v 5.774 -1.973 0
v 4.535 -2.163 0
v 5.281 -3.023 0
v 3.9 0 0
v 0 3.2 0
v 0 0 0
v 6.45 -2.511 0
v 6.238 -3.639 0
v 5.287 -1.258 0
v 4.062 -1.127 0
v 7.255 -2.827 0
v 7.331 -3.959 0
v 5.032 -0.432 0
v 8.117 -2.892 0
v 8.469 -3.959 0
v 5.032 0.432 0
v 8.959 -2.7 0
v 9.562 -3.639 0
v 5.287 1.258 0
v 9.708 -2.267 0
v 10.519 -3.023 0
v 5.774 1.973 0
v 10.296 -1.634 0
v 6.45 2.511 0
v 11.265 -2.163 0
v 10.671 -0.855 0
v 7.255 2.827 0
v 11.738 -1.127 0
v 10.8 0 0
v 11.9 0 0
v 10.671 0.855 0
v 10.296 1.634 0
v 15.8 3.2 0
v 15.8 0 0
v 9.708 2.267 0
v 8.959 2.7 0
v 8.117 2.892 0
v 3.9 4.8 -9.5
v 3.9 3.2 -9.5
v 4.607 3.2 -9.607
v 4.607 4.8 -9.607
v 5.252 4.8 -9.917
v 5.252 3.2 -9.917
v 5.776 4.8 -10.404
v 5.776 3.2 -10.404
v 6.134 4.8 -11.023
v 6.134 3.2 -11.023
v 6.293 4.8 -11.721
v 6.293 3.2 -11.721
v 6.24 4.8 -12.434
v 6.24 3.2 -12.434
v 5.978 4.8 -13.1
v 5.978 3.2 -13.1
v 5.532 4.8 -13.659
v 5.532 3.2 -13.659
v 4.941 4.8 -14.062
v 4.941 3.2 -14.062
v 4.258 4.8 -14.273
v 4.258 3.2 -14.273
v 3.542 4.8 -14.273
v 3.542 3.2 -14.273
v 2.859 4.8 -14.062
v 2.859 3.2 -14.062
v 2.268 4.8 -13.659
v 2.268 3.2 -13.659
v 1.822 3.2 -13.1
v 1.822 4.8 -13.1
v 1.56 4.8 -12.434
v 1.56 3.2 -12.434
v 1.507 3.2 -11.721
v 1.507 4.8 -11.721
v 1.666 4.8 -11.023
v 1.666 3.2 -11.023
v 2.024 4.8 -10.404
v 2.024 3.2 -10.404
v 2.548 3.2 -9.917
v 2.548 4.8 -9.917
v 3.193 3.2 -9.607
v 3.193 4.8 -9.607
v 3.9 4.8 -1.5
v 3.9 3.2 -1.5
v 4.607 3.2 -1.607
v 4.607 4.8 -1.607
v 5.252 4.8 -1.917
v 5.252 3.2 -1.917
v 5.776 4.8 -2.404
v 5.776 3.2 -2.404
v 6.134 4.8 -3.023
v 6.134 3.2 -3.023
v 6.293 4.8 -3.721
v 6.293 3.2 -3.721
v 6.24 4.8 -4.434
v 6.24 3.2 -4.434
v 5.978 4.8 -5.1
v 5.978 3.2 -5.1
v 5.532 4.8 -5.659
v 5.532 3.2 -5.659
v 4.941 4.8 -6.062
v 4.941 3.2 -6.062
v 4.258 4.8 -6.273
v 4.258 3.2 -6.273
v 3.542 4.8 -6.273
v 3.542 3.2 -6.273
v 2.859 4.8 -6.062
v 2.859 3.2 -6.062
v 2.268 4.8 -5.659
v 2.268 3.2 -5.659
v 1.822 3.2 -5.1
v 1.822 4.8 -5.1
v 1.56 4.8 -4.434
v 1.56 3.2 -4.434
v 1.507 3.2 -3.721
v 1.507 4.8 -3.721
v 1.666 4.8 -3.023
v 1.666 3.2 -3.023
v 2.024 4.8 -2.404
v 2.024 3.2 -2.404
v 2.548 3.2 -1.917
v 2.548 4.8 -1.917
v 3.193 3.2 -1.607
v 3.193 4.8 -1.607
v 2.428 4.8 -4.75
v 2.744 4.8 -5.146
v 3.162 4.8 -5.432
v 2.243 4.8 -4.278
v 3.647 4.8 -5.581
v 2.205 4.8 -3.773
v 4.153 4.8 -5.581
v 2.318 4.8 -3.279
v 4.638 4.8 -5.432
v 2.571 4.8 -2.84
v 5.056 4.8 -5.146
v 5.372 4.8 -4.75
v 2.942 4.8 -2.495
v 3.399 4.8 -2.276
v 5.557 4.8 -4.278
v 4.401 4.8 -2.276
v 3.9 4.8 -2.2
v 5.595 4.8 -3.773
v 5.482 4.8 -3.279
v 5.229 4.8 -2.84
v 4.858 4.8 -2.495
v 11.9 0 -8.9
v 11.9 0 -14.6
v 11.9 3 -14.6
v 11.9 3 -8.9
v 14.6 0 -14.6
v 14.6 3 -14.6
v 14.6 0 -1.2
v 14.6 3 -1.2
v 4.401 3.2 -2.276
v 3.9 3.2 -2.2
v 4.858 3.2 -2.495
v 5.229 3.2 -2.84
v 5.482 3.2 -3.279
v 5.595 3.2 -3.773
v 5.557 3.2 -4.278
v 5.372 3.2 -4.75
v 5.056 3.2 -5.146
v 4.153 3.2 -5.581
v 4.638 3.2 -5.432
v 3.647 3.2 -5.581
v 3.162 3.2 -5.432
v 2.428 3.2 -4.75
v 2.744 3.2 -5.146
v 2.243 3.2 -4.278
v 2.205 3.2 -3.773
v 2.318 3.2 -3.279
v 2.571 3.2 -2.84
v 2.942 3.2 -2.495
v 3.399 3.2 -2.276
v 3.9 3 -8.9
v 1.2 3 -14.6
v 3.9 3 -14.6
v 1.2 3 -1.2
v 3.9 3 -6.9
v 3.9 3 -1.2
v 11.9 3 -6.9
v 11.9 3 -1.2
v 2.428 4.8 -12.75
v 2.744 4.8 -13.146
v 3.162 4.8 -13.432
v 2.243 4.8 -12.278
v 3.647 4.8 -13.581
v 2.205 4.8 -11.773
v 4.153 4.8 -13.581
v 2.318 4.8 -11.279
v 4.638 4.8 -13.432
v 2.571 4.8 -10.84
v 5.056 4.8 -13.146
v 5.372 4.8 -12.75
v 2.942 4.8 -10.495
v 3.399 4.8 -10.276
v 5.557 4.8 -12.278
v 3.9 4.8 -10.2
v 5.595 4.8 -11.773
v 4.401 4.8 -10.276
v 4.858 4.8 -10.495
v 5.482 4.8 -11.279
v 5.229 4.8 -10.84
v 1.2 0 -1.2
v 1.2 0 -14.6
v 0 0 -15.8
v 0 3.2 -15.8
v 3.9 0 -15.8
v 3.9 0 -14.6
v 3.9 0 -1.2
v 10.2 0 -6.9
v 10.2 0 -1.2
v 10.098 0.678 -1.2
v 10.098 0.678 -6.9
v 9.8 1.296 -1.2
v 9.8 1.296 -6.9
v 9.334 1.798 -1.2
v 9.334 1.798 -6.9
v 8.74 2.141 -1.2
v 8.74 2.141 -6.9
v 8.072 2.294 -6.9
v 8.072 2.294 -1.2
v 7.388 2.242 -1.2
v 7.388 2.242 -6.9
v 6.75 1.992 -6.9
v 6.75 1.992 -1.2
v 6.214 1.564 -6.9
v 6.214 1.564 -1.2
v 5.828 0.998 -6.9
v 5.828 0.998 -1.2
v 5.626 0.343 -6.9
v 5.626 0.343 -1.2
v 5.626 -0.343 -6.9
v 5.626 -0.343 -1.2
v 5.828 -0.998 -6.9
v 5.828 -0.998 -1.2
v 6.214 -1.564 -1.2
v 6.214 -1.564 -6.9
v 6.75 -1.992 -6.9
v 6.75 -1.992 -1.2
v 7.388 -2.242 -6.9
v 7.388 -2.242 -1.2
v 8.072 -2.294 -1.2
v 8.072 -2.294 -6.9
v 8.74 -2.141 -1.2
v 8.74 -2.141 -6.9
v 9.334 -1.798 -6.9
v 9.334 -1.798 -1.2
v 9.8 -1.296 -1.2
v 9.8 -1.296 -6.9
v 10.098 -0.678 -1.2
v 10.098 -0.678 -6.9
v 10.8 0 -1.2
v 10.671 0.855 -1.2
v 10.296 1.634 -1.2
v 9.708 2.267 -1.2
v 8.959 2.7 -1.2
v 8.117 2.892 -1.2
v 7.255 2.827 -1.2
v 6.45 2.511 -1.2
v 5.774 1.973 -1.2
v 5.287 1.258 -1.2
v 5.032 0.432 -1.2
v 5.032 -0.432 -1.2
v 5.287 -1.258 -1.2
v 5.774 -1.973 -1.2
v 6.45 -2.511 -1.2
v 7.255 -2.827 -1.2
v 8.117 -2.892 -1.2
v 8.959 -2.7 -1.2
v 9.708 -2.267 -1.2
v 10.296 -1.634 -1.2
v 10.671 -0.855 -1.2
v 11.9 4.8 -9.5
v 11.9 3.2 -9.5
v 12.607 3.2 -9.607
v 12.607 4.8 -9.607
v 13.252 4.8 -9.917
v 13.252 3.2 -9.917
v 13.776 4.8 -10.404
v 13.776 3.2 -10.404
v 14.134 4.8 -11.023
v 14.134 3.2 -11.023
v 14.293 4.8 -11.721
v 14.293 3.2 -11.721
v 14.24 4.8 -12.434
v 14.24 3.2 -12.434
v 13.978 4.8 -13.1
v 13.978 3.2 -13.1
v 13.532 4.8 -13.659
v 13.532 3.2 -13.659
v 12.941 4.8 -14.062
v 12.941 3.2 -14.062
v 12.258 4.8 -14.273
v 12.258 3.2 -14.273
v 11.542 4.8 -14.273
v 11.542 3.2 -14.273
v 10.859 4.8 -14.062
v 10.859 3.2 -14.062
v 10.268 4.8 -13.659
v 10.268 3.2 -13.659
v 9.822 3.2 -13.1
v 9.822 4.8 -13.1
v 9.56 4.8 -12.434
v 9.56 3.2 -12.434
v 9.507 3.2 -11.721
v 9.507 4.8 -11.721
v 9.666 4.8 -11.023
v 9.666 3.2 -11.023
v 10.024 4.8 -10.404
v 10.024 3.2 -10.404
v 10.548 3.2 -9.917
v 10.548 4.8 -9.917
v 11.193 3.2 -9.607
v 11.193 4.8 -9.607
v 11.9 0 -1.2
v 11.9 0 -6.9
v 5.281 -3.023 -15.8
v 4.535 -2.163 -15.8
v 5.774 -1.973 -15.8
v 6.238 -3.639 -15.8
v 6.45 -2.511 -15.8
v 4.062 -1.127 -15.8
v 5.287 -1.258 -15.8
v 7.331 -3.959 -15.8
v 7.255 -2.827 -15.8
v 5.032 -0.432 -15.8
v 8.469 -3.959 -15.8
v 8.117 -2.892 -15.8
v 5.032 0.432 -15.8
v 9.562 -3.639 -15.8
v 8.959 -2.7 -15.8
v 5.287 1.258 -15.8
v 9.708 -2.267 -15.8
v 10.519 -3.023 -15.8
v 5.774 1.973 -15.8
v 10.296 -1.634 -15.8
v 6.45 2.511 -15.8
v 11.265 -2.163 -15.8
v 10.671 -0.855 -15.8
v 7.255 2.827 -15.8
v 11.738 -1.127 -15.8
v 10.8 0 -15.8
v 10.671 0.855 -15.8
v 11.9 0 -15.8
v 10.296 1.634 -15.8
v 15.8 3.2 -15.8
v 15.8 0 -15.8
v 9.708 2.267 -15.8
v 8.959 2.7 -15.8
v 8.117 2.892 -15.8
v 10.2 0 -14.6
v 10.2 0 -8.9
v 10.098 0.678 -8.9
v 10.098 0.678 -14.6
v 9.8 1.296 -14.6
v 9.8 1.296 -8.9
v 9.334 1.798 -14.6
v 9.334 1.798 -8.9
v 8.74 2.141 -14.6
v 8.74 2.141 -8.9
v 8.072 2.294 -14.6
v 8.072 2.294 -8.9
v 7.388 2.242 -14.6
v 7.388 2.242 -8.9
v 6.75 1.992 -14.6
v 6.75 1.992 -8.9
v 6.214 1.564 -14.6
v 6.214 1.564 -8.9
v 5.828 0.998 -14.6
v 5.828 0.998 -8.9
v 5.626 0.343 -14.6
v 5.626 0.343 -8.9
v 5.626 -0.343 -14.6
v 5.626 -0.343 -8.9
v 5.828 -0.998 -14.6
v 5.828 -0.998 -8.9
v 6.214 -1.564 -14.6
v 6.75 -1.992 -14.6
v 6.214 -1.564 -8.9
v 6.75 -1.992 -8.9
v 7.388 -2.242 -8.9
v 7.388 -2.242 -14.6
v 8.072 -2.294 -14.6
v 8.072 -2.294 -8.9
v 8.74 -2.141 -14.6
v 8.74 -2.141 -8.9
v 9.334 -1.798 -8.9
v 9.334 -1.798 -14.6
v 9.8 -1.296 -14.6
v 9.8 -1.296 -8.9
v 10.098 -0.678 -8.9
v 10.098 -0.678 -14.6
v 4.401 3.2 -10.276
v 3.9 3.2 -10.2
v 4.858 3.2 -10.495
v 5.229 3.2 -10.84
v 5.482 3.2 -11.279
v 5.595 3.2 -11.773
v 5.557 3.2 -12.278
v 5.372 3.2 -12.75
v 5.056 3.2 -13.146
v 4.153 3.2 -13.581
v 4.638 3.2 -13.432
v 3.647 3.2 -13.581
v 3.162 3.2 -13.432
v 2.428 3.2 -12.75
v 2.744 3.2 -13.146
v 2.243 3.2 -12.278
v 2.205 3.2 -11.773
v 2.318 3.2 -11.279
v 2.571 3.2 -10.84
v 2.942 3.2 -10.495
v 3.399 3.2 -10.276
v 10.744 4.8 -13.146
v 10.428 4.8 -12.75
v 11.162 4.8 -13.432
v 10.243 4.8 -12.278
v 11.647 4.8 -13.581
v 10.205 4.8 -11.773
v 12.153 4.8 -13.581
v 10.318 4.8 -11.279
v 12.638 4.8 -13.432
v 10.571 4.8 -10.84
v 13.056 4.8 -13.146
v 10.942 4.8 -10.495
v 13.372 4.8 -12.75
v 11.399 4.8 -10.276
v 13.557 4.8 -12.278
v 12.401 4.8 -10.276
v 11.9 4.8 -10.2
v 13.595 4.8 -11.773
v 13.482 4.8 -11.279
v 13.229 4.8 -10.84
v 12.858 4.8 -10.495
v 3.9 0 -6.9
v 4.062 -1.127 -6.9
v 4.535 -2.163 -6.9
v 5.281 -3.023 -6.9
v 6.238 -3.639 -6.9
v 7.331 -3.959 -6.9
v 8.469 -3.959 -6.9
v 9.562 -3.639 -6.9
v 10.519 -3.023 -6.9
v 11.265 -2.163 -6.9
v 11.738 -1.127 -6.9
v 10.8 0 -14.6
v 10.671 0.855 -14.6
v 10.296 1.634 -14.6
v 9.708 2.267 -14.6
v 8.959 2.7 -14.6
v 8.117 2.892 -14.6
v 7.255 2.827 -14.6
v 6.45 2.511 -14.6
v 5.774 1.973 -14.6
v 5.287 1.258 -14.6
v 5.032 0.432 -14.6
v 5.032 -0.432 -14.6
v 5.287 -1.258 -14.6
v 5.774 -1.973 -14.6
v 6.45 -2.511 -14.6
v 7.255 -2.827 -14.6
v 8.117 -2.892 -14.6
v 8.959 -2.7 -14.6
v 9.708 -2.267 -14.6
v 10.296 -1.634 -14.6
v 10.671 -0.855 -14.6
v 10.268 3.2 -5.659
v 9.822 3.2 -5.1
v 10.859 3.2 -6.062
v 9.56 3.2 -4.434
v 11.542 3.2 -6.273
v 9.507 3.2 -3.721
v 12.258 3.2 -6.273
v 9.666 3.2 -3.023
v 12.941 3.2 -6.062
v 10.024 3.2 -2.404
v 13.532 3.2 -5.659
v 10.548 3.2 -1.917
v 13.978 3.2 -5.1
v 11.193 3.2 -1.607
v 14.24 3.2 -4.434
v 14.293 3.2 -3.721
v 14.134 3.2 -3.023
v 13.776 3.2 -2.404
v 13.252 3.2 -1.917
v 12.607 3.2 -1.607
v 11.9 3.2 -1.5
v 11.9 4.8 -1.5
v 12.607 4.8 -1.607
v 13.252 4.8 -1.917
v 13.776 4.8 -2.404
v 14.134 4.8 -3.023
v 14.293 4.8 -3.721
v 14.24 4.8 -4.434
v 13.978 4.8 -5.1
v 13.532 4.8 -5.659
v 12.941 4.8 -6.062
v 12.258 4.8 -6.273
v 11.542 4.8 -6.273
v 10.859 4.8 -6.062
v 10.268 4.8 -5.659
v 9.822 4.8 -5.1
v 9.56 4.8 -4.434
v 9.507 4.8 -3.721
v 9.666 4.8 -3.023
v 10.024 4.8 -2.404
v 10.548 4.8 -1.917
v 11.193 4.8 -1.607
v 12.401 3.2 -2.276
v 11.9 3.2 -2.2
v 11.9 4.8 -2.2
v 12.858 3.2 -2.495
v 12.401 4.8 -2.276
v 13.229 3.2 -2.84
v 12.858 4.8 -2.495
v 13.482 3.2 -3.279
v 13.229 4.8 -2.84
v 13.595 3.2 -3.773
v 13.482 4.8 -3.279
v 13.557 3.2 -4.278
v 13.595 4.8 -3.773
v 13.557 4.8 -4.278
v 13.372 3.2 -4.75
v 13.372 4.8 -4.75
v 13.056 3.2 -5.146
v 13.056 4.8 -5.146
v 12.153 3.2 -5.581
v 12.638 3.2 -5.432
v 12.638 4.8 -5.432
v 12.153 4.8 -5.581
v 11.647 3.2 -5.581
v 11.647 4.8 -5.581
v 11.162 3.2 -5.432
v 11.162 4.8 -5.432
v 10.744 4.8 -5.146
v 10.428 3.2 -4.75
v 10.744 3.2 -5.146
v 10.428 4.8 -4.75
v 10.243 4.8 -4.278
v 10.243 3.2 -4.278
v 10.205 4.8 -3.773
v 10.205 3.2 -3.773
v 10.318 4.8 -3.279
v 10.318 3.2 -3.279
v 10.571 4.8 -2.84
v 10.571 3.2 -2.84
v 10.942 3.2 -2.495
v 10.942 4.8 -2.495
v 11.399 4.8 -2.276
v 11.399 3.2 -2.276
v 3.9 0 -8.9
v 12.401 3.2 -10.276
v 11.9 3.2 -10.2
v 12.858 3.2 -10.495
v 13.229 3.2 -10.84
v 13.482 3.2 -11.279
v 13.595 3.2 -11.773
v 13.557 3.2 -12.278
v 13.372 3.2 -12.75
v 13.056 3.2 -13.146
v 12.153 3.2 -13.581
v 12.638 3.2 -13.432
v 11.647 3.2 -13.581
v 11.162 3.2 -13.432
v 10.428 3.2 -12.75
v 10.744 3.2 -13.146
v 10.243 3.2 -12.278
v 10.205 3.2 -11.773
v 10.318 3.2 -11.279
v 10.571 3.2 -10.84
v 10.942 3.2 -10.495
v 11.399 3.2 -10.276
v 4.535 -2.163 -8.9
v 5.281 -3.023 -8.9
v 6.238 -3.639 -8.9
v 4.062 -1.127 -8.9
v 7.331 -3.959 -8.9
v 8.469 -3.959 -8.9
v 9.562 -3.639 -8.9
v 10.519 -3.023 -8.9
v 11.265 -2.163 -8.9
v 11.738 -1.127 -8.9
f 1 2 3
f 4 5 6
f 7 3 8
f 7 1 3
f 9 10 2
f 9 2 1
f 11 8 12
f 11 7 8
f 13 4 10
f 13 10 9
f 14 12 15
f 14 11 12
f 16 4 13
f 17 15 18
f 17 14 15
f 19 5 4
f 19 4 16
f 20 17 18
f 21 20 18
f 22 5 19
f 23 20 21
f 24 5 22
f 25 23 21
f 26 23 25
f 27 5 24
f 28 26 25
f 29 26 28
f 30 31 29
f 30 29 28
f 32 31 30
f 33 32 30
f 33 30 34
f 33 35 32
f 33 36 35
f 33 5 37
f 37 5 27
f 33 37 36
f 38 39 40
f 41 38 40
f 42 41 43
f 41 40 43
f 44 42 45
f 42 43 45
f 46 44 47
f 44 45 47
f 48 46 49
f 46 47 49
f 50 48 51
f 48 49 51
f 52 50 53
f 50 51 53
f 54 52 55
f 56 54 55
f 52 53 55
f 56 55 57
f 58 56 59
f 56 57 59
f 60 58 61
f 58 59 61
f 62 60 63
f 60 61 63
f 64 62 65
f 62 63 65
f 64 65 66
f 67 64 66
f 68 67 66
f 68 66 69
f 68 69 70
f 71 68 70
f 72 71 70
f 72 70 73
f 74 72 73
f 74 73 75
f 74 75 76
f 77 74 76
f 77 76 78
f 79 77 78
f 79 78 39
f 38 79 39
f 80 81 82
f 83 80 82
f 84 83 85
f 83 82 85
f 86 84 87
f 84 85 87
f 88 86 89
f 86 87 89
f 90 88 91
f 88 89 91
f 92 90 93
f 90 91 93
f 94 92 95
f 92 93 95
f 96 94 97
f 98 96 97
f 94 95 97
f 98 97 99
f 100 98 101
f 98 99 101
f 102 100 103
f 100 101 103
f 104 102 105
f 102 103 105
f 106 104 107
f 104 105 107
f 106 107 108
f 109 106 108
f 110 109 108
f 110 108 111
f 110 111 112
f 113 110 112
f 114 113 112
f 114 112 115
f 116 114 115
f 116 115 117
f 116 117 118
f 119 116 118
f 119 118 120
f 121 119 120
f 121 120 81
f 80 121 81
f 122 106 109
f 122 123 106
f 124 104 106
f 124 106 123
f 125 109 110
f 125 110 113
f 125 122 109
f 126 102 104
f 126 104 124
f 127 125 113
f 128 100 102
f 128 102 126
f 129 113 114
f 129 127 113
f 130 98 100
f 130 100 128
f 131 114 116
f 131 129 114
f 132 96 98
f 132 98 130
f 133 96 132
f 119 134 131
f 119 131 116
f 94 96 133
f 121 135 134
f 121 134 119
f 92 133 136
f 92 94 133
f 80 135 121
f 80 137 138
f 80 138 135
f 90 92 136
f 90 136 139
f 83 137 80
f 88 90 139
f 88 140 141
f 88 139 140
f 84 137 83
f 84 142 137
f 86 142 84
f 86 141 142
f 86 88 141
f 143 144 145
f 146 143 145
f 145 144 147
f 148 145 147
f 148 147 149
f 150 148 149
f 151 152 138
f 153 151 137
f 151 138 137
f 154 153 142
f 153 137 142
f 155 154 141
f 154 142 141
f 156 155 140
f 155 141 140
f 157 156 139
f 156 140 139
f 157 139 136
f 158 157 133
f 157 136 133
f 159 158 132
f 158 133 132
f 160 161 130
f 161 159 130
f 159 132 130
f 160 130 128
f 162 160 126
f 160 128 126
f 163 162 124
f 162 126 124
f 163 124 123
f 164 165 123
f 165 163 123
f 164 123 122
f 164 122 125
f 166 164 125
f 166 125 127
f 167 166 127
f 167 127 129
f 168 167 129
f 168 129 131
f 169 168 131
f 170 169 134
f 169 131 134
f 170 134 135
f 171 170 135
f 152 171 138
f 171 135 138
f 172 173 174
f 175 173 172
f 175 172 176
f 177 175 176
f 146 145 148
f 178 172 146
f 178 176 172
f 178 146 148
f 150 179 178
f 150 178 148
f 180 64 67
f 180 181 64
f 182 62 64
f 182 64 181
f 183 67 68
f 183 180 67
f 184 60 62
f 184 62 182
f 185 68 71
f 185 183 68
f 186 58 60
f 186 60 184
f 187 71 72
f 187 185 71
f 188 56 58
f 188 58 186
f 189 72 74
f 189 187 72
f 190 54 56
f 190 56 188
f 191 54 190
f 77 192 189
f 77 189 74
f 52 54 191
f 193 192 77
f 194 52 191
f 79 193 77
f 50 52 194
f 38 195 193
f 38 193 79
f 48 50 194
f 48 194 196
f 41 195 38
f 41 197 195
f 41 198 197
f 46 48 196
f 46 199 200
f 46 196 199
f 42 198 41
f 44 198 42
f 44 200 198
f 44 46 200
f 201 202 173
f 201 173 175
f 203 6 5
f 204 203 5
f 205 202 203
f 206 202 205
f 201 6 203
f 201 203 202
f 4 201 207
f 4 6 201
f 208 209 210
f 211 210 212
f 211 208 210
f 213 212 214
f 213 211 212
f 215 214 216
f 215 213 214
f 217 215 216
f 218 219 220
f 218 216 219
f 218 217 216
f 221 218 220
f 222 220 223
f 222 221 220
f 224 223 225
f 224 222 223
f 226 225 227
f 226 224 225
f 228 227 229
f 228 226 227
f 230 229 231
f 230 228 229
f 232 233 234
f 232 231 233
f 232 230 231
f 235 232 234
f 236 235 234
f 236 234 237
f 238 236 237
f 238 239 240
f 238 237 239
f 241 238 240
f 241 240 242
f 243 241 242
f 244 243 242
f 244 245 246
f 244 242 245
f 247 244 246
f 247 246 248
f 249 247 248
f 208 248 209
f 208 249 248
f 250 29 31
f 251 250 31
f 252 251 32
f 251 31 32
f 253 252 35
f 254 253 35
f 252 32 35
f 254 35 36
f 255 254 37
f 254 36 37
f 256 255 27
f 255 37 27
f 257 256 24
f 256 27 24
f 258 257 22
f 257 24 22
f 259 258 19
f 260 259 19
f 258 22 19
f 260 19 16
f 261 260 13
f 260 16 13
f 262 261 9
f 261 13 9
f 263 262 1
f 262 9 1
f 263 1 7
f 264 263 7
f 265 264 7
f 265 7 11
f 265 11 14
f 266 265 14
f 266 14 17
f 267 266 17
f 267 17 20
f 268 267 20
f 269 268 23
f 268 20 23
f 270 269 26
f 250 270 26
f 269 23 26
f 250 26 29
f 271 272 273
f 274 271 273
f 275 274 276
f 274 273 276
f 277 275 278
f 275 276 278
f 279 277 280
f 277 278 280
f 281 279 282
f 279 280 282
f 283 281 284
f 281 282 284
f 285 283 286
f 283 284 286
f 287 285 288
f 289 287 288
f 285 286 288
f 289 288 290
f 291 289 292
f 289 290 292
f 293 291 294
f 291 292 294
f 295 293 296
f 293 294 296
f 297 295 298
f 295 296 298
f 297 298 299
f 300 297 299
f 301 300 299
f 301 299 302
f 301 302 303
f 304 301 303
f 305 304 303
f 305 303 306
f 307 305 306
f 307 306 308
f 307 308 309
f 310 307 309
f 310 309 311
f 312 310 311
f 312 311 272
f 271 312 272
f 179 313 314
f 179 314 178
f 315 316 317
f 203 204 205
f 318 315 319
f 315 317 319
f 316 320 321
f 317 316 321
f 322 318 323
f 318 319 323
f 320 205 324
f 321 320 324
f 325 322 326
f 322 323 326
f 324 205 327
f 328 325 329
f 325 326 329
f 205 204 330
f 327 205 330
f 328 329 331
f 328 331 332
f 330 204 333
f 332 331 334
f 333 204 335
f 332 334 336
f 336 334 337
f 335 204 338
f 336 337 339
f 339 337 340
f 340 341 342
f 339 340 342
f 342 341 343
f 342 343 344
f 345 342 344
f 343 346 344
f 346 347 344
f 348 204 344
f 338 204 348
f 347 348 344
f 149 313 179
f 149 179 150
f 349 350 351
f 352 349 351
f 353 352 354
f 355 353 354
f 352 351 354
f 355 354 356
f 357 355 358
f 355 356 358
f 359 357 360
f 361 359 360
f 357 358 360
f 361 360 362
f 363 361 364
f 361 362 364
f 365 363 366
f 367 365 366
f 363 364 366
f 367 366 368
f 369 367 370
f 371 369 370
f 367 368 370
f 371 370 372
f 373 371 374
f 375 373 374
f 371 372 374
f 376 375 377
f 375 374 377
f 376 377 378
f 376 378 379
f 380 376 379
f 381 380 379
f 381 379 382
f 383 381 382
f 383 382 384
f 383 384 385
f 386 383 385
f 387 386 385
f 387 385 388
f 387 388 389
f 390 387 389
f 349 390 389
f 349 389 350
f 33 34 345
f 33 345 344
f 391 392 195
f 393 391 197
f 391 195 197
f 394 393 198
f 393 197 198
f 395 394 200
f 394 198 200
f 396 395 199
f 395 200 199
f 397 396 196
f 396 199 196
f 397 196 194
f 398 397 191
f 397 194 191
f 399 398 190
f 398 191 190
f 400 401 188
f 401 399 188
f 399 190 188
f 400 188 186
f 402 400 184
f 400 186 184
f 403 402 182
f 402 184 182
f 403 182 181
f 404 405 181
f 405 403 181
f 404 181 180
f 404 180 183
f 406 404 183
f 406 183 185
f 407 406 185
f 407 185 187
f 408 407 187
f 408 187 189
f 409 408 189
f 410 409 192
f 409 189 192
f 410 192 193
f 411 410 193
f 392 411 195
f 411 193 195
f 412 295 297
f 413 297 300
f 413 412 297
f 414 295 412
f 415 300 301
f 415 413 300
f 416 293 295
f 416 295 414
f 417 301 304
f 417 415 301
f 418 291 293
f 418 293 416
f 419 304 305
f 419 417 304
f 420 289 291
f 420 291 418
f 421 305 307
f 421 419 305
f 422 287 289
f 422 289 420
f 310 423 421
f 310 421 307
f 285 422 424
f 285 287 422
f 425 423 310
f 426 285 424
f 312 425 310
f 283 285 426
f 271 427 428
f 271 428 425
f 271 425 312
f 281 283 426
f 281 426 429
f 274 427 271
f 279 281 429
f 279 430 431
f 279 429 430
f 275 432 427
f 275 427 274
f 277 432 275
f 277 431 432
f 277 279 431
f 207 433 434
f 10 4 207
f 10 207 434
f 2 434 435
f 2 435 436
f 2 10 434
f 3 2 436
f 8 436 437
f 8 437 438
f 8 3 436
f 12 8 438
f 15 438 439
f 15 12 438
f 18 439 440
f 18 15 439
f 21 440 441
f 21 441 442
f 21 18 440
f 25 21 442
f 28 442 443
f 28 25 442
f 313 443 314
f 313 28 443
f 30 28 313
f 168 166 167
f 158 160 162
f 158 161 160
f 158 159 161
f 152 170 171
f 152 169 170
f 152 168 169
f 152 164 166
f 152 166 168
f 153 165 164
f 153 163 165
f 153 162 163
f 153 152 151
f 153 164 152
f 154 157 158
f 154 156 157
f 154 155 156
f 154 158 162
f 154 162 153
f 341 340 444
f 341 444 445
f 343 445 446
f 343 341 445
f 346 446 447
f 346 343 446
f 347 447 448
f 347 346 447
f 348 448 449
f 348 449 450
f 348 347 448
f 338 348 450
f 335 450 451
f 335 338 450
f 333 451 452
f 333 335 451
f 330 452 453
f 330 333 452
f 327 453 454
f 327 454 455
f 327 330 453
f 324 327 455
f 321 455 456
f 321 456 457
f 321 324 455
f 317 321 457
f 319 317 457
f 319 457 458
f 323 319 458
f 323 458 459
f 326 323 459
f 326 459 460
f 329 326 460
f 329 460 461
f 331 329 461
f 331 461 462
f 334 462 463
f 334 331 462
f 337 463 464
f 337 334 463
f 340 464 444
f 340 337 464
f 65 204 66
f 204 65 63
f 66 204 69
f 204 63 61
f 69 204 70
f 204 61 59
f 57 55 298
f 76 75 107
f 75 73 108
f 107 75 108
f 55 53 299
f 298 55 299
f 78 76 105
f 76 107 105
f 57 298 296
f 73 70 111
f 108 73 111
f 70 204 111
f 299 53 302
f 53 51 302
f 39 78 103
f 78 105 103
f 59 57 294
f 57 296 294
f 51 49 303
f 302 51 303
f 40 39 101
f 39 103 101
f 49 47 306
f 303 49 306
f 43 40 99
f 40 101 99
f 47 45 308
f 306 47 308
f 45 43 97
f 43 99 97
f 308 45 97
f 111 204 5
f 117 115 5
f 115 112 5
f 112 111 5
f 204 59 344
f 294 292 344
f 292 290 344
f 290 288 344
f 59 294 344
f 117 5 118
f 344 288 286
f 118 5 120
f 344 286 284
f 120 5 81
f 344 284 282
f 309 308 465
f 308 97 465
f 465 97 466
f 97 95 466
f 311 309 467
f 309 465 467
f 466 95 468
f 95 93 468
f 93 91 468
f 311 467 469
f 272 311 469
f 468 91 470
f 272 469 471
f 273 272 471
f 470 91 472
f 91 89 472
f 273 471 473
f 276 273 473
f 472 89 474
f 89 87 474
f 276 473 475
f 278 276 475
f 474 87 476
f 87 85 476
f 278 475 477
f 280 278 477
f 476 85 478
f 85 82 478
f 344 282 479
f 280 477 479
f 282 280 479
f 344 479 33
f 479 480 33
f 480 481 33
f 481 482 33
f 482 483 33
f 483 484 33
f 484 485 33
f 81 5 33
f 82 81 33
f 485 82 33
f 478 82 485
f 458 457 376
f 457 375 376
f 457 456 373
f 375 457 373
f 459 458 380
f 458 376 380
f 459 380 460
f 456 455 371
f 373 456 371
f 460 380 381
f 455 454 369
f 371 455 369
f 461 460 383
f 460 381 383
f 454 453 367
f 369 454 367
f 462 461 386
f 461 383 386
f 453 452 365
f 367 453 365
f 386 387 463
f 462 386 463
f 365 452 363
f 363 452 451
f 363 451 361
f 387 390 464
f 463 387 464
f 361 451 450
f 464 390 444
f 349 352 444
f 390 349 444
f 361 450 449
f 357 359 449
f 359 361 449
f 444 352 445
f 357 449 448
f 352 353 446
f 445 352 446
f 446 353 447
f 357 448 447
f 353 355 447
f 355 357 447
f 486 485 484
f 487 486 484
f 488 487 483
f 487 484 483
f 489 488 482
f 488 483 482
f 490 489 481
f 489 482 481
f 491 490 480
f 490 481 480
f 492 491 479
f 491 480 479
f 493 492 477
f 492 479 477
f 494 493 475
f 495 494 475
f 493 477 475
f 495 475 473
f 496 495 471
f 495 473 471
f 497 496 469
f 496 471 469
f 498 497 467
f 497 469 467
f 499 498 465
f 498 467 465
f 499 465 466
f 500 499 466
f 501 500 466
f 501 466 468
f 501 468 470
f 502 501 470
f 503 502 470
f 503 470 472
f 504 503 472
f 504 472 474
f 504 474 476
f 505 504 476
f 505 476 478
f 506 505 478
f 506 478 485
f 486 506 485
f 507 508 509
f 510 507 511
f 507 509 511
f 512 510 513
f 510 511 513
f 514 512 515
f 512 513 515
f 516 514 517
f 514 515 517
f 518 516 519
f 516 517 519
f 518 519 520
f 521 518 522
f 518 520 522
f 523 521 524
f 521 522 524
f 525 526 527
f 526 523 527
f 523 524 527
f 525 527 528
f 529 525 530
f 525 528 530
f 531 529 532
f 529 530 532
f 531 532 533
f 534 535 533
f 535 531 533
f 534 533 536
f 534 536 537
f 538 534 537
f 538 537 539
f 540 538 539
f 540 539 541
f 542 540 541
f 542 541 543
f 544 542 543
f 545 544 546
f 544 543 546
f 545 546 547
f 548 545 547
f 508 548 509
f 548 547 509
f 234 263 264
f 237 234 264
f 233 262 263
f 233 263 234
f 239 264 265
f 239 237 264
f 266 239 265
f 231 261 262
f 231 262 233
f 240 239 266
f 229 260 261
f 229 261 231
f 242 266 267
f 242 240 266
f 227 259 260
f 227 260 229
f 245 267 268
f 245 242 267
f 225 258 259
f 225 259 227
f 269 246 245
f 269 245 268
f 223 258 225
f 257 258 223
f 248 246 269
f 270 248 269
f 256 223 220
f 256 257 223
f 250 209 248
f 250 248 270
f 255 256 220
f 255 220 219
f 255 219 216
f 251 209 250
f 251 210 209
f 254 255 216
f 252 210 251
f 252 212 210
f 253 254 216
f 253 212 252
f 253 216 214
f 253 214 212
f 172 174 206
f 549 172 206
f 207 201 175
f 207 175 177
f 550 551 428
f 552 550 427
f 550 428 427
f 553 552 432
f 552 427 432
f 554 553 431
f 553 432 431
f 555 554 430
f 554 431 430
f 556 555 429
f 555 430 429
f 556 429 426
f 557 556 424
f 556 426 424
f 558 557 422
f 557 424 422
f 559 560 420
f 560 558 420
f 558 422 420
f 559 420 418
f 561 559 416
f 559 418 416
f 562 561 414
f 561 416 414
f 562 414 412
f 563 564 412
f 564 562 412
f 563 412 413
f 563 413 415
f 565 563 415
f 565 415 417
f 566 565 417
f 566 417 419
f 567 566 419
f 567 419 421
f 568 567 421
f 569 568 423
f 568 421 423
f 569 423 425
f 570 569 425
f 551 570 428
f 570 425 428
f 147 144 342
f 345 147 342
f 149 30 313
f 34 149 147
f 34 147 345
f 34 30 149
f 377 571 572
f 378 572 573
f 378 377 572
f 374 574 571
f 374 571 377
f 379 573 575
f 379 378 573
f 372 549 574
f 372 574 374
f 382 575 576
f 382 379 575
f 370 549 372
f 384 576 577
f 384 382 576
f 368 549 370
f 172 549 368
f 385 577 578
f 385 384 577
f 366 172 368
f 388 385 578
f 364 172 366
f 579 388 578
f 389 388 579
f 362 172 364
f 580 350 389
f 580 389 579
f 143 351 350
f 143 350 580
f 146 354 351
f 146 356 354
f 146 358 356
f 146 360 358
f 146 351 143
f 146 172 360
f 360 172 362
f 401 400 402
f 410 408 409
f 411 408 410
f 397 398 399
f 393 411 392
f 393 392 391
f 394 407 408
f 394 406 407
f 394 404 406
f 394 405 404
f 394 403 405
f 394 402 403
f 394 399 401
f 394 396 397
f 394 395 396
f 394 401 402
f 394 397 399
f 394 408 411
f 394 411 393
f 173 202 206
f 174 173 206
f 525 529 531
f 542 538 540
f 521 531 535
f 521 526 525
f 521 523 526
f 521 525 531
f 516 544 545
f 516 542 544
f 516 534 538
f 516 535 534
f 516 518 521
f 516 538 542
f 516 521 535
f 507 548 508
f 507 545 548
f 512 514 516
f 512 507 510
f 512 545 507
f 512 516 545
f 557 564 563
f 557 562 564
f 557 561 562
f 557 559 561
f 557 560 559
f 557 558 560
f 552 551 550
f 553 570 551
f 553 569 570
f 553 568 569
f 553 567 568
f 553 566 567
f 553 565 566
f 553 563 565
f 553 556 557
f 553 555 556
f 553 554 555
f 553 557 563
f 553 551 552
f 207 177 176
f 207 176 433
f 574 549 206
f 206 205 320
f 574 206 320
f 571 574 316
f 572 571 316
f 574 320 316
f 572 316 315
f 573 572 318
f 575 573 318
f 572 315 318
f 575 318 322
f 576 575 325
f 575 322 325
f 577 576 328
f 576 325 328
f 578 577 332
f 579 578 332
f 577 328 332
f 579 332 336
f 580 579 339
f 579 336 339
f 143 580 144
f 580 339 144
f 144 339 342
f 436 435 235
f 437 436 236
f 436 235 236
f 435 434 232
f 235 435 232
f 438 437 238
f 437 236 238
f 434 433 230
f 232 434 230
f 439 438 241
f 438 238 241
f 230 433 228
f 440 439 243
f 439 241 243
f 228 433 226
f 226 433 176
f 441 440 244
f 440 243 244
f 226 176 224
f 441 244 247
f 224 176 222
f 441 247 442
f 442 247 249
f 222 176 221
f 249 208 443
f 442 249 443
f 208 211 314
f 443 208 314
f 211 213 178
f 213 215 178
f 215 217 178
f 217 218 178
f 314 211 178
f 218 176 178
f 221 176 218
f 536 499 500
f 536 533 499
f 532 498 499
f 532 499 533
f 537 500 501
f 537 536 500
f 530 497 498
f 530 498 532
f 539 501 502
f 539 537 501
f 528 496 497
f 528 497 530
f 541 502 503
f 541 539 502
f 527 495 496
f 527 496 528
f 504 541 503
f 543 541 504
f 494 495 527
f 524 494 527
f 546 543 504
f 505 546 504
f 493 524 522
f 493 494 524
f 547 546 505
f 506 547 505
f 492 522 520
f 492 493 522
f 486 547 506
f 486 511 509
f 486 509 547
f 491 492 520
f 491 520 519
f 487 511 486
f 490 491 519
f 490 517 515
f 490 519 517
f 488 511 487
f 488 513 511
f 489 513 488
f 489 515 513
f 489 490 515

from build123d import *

# Parameters (mm, degrees)
SKETCH1_W            = 15.8
SKETCH1_H            = 3.2
BOSS_EXTRUDE1_DEPTH  = 15.8
SKETCH2_R            = 2.4
BOSS_EXTRUDE2_DEPTH  = 1.6
SKETCH10_R           = 1.7
CUT_EXTRUDE8_DEPTH   = 1.6
LPATTERN1_COUNT      = 2
LPATTERN1_PITCH      = 8
LPATTERN1_COUNT_DIR2 = 2
LPATTERN1_PITCH_DIR2 = 8
SKETCH3_W            = 13.4
SKETCH3_H            = 13.4
CUT_EXTRUDE1_DEPTH   = 3
BOSS_EXTRUDE3_DEPTH  = 6.9
SKETCH8_R            = 2.9
CUT_EXTRUDE6_DEPTH   = 1.2
CUT_EXTRUDE7_START   = -5.7
SKETCH9_R            = 2.3
CUT_EXTRUDE7_DEPTH   = 28.741778513


with BuildPart() as part:
    # Sketch1 → Boss-Extrude1 (new body)
    with BuildSketch(Plane.XY):
        with Locations((7.9, 1.6)):
            Rectangle(SKETCH1_W, SKETCH1_H)
    extrude(amount=-BOSS_EXTRUDE1_DEPTH)

    # Sketch2 → Boss-Extrude2 (add)
    with BuildSketch(Plane(origin=(0, 3.2, 0), x_dir=(1, 0, 0), z_dir=(0, 1, 0))):
        with Locations(Location((3.9, 3.9, 0), (0, 0, 270))):
            Circle(SKETCH2_R)
    boss_extrude2 = extrude(amount=BOSS_EXTRUDE2_DEPTH)

    # Sketch10 → Cut-Extrude8 (cut)
    with BuildSketch(Plane(origin=(0, 4.8, 0), x_dir=(1, 0, 0), z_dir=(0, 1, 0))):
        with Locations(Location((3.9, 3.9, 0), (0, 0, 270))):
            Circle(SKETCH10_R)
    cut_extrude8 = extrude(amount=-CUT_EXTRUDE8_DEPTH, mode=Mode.SUBTRACT)

    # LPattern1: Boss-Extrude2, Cut-Extrude8 2 × 2
    with Locations(*[(j * LPATTERN1_PITCH_DIR2, 0, -i * LPATTERN1_PITCH) for i in range(LPATTERN1_COUNT) for j in range(LPATTERN1_COUNT_DIR2) if (i, j) != (0, 0)]):
        add(boss_extrude2)
        add(cut_extrude8, mode=Mode.SUBTRACT)

    # Sketch3 → Cut-Extrude1 (cut)
    with BuildSketch(Plane.XZ):
        with Locations((7.9, -7.9)):
            Rectangle(SKETCH3_W, SKETCH3_H)
    extrude(amount=-CUT_EXTRUDE1_DEPTH, mode=Mode.SUBTRACT)

    # Sketch4 → Boss-Extrude3 (add)
    with BuildSketch(Plane.XY):
        with BuildLine():
            Line((11.9, 0), (11.9, 3.2))
            Line((11.9, 3.2), (3.9, 3.2))
            Line((3.9, 3.2), (3.9, 0))
            ThreePointArc((3.9, 0), (7.9, -4), (11.9, 0))
        make_face()
    boss_extrude3 = extrude(amount=-BOSS_EXTRUDE3_DEPTH)

    # Sketch8 → Cut-Extrude6 (cut)
    with BuildSketch(Plane.XY):
        with Locations((7.9, 0)):
            Circle(SKETCH8_R)
    cut_extrude6 = extrude(amount=-CUT_EXTRUDE6_DEPTH, mode=Mode.SUBTRACT)

    # Sketch9 → Cut-Extrude7 (cut)
    with BuildSketch(Plane.XY.offset(-1.2).offset(CUT_EXTRUDE7_START)):
        with Locations((7.9, 0)):
            Circle(SKETCH9_R)
    cut_extrude7 = extrude(amount=CUT_EXTRUDE7_DEPTH, mode=Mode.SUBTRACT)

    # Mirror1: Boss-Extrude3, Cut-Extrude6, Cut-Extrude7 across plane
    add(boss_extrude3.mirror(Plane.XY.offset(-7.9)))
    add(cut_extrude6.mirror(Plane.XY.offset(-7.9)), mode=Mode.SUBTRACT)
    add(cut_extrude7.mirror(Plane.XY.offset(-7.9)), mode=Mode.SUBTRACT)


solid = part.part
